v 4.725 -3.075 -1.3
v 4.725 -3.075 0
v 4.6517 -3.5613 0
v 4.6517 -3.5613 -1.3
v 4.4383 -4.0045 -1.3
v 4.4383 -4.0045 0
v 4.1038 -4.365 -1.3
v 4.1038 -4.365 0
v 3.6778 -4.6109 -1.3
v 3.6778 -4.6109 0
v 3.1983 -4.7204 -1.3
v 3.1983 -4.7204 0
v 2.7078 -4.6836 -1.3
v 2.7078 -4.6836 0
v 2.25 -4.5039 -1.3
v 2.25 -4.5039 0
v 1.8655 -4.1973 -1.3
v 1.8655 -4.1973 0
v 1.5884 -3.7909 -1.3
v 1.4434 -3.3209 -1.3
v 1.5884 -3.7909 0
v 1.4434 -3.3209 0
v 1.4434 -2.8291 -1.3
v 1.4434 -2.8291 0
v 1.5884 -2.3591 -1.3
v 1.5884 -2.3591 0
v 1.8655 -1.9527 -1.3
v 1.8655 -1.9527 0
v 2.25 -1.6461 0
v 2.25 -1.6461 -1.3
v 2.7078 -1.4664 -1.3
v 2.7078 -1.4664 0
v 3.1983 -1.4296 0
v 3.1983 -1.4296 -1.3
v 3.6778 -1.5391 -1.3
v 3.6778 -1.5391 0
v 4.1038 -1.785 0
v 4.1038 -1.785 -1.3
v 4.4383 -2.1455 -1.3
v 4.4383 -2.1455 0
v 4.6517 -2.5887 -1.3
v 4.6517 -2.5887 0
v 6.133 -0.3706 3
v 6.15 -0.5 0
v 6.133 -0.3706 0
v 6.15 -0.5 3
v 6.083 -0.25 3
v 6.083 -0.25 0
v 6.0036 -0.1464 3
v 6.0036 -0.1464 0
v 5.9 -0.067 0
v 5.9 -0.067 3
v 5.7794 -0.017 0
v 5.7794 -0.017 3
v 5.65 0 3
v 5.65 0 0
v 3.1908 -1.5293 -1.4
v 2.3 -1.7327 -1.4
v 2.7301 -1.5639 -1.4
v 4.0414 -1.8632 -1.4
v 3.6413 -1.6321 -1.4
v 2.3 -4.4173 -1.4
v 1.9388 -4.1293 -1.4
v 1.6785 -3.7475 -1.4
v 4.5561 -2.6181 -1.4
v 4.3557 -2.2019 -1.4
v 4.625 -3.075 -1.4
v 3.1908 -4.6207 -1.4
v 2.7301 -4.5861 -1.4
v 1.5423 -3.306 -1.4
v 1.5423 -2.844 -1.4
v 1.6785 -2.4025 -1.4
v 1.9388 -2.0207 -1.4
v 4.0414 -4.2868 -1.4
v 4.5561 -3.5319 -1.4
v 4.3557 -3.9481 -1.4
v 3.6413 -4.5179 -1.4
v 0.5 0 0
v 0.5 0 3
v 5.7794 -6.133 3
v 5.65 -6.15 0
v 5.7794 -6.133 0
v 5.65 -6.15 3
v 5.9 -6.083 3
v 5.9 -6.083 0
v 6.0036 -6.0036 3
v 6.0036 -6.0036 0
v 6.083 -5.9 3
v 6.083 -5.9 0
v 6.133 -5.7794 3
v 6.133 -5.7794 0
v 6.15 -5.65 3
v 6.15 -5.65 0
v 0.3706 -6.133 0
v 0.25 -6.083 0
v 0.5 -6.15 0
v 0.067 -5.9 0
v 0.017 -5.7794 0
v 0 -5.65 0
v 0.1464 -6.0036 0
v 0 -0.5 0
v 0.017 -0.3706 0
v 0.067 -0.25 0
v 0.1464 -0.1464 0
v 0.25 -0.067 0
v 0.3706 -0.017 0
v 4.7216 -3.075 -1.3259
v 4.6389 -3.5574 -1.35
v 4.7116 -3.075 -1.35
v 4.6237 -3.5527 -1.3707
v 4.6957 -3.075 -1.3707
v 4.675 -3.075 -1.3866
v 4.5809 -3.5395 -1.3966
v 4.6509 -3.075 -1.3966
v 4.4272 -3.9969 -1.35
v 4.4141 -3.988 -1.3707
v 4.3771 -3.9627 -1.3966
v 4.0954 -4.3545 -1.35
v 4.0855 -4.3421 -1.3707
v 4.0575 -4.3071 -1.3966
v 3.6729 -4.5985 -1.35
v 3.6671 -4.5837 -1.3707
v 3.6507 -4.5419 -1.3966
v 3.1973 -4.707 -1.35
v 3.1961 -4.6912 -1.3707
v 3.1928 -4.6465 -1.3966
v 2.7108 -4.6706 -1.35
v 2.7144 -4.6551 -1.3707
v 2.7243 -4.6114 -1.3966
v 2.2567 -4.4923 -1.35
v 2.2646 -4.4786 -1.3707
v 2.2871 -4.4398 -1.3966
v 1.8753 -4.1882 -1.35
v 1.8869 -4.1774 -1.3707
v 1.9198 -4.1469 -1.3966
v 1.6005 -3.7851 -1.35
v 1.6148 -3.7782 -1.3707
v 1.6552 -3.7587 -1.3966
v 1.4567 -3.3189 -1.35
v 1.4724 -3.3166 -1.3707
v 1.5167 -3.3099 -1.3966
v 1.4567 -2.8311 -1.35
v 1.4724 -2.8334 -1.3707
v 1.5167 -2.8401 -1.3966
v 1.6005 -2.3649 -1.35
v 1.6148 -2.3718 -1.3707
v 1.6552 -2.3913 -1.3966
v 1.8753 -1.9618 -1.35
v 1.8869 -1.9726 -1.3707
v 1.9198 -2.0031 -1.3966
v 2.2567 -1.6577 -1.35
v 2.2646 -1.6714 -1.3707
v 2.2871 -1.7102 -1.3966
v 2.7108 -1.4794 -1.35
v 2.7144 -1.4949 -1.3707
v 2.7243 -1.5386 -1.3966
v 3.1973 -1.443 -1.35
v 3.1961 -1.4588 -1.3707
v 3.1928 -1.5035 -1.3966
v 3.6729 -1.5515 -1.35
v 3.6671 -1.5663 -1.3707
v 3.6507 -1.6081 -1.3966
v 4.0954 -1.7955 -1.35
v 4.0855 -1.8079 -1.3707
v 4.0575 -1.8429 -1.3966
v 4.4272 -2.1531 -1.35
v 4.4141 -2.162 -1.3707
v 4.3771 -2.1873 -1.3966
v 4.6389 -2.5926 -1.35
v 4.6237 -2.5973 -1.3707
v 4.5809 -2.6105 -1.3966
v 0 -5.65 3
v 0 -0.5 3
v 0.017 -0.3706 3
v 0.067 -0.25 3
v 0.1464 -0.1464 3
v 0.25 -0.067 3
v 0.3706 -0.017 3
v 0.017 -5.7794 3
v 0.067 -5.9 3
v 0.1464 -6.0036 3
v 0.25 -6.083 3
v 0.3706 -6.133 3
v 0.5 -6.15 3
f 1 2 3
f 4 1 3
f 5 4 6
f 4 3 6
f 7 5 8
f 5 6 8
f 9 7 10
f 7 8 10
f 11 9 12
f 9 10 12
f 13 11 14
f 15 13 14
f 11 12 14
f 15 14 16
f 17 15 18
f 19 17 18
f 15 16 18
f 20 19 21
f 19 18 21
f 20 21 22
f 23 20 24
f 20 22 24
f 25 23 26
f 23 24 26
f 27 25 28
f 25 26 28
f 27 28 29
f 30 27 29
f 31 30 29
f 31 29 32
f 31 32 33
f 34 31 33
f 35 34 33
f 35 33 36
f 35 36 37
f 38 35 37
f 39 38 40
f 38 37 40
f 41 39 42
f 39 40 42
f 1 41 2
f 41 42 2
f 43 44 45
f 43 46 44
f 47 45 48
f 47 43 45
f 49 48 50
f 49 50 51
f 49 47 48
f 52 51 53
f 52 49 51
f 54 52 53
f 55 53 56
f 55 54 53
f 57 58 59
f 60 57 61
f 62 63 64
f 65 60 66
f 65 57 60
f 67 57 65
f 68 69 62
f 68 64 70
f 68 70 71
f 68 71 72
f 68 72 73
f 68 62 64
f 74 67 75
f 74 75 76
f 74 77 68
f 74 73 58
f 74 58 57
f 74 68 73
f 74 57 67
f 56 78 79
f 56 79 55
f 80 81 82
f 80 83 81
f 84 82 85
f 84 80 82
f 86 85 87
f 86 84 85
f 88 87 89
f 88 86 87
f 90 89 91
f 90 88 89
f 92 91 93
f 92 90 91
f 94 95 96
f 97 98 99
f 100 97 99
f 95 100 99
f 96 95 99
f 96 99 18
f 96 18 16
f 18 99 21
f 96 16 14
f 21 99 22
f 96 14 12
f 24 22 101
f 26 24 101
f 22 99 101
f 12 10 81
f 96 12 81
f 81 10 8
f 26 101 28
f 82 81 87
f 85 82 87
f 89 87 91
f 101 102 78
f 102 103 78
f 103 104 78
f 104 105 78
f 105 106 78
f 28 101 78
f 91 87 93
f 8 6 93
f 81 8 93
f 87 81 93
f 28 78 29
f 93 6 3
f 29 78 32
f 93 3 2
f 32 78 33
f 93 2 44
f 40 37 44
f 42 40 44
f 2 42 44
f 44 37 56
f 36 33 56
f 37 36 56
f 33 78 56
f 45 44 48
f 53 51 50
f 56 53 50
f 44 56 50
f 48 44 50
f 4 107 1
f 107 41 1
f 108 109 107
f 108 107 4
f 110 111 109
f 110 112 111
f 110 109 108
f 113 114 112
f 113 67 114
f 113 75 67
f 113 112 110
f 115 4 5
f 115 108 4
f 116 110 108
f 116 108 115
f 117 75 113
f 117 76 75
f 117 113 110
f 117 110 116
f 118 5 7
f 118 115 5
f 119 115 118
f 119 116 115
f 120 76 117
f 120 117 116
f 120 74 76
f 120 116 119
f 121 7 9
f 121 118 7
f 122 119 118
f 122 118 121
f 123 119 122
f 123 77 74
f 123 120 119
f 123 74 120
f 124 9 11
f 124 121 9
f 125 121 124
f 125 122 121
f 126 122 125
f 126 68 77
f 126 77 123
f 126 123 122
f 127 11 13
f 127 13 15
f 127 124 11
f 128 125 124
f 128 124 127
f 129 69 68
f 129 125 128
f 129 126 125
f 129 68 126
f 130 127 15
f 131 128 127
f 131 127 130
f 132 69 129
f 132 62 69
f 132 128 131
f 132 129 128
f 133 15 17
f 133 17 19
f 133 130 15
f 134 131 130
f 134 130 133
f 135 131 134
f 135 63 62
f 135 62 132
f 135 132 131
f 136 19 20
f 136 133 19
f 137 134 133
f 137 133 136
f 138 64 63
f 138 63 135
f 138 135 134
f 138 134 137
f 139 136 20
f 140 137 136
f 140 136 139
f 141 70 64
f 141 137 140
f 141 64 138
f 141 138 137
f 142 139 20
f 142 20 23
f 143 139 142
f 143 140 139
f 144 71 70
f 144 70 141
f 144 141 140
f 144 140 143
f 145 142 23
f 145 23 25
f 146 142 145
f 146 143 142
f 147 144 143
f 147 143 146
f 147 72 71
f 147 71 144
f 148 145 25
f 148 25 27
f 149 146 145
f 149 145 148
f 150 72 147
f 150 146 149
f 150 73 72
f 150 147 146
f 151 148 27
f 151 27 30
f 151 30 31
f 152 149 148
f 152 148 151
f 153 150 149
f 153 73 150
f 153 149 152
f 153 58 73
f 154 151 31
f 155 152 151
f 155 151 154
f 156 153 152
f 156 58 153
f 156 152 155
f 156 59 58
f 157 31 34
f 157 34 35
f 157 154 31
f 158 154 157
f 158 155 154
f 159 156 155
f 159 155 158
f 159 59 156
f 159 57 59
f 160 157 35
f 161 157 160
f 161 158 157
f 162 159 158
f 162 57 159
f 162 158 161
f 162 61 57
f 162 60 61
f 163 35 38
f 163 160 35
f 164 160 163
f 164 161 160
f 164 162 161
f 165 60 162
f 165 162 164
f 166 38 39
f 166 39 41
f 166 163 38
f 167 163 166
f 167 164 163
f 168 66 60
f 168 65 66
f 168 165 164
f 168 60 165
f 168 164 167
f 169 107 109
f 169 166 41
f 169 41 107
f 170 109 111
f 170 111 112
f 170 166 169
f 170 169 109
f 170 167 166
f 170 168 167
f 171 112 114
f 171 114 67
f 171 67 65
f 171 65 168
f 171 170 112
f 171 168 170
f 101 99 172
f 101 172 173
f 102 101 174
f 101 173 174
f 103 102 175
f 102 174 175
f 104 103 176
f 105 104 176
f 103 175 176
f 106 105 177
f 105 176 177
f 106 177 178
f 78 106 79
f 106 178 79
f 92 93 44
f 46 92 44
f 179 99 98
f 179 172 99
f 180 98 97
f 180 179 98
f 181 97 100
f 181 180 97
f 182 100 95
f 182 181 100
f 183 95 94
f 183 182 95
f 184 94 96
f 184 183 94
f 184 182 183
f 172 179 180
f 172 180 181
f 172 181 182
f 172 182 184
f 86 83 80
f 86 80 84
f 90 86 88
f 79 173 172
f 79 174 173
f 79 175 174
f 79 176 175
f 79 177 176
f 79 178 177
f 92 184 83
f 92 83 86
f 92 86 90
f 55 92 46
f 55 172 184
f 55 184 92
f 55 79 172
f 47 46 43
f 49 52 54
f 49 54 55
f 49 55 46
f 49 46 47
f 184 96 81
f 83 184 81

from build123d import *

# Parameters (mm, degrees)
F0_W     = 6.15
F0_H     = 6.15
F1_DEPTH = 3
F2_R     = 0.5
F3_R     = 1.65
F4_DEPTH = 1.4
F5_R     = 0.1


with BuildPart() as f1:
    # F0 (on Top) → F1 (new body)
    with BuildSketch(Plane.XY):
        with Locations((3.075, -3.075)):
            Rectangle(F0_W, F0_H)
    extrude(amount=F1_DEPTH)

    # F2
    f2_edges = [f1.edges().sort_by_distance(p)[0] for p in [
        (0, 0, 1.5),
        (6.15, 0, 1.5),
        (0, -6.15, 1.5),
        (6.15, -6.15, 1.5),
    ]]
    fillet(f2_edges, radius=F2_R)

    # F3 (on face) → F4 (join)
    with BuildSketch(Plane(origin=(0, 0, 0), x_dir=(1, 0, 0), z_dir=(0, 0, -1))):
        with Locations((3.075, 3.075)):
            Circle(F3_R)
    extrude(amount=F4_DEPTH)

    # F5
    f5_edges = [f1.edges().sort_by_distance(p)[0] for p in [
        (1.425, -3.075, -1.4),
    ]]
    fillet(f5_edges, radius=F5_R)


solid = f1.part
